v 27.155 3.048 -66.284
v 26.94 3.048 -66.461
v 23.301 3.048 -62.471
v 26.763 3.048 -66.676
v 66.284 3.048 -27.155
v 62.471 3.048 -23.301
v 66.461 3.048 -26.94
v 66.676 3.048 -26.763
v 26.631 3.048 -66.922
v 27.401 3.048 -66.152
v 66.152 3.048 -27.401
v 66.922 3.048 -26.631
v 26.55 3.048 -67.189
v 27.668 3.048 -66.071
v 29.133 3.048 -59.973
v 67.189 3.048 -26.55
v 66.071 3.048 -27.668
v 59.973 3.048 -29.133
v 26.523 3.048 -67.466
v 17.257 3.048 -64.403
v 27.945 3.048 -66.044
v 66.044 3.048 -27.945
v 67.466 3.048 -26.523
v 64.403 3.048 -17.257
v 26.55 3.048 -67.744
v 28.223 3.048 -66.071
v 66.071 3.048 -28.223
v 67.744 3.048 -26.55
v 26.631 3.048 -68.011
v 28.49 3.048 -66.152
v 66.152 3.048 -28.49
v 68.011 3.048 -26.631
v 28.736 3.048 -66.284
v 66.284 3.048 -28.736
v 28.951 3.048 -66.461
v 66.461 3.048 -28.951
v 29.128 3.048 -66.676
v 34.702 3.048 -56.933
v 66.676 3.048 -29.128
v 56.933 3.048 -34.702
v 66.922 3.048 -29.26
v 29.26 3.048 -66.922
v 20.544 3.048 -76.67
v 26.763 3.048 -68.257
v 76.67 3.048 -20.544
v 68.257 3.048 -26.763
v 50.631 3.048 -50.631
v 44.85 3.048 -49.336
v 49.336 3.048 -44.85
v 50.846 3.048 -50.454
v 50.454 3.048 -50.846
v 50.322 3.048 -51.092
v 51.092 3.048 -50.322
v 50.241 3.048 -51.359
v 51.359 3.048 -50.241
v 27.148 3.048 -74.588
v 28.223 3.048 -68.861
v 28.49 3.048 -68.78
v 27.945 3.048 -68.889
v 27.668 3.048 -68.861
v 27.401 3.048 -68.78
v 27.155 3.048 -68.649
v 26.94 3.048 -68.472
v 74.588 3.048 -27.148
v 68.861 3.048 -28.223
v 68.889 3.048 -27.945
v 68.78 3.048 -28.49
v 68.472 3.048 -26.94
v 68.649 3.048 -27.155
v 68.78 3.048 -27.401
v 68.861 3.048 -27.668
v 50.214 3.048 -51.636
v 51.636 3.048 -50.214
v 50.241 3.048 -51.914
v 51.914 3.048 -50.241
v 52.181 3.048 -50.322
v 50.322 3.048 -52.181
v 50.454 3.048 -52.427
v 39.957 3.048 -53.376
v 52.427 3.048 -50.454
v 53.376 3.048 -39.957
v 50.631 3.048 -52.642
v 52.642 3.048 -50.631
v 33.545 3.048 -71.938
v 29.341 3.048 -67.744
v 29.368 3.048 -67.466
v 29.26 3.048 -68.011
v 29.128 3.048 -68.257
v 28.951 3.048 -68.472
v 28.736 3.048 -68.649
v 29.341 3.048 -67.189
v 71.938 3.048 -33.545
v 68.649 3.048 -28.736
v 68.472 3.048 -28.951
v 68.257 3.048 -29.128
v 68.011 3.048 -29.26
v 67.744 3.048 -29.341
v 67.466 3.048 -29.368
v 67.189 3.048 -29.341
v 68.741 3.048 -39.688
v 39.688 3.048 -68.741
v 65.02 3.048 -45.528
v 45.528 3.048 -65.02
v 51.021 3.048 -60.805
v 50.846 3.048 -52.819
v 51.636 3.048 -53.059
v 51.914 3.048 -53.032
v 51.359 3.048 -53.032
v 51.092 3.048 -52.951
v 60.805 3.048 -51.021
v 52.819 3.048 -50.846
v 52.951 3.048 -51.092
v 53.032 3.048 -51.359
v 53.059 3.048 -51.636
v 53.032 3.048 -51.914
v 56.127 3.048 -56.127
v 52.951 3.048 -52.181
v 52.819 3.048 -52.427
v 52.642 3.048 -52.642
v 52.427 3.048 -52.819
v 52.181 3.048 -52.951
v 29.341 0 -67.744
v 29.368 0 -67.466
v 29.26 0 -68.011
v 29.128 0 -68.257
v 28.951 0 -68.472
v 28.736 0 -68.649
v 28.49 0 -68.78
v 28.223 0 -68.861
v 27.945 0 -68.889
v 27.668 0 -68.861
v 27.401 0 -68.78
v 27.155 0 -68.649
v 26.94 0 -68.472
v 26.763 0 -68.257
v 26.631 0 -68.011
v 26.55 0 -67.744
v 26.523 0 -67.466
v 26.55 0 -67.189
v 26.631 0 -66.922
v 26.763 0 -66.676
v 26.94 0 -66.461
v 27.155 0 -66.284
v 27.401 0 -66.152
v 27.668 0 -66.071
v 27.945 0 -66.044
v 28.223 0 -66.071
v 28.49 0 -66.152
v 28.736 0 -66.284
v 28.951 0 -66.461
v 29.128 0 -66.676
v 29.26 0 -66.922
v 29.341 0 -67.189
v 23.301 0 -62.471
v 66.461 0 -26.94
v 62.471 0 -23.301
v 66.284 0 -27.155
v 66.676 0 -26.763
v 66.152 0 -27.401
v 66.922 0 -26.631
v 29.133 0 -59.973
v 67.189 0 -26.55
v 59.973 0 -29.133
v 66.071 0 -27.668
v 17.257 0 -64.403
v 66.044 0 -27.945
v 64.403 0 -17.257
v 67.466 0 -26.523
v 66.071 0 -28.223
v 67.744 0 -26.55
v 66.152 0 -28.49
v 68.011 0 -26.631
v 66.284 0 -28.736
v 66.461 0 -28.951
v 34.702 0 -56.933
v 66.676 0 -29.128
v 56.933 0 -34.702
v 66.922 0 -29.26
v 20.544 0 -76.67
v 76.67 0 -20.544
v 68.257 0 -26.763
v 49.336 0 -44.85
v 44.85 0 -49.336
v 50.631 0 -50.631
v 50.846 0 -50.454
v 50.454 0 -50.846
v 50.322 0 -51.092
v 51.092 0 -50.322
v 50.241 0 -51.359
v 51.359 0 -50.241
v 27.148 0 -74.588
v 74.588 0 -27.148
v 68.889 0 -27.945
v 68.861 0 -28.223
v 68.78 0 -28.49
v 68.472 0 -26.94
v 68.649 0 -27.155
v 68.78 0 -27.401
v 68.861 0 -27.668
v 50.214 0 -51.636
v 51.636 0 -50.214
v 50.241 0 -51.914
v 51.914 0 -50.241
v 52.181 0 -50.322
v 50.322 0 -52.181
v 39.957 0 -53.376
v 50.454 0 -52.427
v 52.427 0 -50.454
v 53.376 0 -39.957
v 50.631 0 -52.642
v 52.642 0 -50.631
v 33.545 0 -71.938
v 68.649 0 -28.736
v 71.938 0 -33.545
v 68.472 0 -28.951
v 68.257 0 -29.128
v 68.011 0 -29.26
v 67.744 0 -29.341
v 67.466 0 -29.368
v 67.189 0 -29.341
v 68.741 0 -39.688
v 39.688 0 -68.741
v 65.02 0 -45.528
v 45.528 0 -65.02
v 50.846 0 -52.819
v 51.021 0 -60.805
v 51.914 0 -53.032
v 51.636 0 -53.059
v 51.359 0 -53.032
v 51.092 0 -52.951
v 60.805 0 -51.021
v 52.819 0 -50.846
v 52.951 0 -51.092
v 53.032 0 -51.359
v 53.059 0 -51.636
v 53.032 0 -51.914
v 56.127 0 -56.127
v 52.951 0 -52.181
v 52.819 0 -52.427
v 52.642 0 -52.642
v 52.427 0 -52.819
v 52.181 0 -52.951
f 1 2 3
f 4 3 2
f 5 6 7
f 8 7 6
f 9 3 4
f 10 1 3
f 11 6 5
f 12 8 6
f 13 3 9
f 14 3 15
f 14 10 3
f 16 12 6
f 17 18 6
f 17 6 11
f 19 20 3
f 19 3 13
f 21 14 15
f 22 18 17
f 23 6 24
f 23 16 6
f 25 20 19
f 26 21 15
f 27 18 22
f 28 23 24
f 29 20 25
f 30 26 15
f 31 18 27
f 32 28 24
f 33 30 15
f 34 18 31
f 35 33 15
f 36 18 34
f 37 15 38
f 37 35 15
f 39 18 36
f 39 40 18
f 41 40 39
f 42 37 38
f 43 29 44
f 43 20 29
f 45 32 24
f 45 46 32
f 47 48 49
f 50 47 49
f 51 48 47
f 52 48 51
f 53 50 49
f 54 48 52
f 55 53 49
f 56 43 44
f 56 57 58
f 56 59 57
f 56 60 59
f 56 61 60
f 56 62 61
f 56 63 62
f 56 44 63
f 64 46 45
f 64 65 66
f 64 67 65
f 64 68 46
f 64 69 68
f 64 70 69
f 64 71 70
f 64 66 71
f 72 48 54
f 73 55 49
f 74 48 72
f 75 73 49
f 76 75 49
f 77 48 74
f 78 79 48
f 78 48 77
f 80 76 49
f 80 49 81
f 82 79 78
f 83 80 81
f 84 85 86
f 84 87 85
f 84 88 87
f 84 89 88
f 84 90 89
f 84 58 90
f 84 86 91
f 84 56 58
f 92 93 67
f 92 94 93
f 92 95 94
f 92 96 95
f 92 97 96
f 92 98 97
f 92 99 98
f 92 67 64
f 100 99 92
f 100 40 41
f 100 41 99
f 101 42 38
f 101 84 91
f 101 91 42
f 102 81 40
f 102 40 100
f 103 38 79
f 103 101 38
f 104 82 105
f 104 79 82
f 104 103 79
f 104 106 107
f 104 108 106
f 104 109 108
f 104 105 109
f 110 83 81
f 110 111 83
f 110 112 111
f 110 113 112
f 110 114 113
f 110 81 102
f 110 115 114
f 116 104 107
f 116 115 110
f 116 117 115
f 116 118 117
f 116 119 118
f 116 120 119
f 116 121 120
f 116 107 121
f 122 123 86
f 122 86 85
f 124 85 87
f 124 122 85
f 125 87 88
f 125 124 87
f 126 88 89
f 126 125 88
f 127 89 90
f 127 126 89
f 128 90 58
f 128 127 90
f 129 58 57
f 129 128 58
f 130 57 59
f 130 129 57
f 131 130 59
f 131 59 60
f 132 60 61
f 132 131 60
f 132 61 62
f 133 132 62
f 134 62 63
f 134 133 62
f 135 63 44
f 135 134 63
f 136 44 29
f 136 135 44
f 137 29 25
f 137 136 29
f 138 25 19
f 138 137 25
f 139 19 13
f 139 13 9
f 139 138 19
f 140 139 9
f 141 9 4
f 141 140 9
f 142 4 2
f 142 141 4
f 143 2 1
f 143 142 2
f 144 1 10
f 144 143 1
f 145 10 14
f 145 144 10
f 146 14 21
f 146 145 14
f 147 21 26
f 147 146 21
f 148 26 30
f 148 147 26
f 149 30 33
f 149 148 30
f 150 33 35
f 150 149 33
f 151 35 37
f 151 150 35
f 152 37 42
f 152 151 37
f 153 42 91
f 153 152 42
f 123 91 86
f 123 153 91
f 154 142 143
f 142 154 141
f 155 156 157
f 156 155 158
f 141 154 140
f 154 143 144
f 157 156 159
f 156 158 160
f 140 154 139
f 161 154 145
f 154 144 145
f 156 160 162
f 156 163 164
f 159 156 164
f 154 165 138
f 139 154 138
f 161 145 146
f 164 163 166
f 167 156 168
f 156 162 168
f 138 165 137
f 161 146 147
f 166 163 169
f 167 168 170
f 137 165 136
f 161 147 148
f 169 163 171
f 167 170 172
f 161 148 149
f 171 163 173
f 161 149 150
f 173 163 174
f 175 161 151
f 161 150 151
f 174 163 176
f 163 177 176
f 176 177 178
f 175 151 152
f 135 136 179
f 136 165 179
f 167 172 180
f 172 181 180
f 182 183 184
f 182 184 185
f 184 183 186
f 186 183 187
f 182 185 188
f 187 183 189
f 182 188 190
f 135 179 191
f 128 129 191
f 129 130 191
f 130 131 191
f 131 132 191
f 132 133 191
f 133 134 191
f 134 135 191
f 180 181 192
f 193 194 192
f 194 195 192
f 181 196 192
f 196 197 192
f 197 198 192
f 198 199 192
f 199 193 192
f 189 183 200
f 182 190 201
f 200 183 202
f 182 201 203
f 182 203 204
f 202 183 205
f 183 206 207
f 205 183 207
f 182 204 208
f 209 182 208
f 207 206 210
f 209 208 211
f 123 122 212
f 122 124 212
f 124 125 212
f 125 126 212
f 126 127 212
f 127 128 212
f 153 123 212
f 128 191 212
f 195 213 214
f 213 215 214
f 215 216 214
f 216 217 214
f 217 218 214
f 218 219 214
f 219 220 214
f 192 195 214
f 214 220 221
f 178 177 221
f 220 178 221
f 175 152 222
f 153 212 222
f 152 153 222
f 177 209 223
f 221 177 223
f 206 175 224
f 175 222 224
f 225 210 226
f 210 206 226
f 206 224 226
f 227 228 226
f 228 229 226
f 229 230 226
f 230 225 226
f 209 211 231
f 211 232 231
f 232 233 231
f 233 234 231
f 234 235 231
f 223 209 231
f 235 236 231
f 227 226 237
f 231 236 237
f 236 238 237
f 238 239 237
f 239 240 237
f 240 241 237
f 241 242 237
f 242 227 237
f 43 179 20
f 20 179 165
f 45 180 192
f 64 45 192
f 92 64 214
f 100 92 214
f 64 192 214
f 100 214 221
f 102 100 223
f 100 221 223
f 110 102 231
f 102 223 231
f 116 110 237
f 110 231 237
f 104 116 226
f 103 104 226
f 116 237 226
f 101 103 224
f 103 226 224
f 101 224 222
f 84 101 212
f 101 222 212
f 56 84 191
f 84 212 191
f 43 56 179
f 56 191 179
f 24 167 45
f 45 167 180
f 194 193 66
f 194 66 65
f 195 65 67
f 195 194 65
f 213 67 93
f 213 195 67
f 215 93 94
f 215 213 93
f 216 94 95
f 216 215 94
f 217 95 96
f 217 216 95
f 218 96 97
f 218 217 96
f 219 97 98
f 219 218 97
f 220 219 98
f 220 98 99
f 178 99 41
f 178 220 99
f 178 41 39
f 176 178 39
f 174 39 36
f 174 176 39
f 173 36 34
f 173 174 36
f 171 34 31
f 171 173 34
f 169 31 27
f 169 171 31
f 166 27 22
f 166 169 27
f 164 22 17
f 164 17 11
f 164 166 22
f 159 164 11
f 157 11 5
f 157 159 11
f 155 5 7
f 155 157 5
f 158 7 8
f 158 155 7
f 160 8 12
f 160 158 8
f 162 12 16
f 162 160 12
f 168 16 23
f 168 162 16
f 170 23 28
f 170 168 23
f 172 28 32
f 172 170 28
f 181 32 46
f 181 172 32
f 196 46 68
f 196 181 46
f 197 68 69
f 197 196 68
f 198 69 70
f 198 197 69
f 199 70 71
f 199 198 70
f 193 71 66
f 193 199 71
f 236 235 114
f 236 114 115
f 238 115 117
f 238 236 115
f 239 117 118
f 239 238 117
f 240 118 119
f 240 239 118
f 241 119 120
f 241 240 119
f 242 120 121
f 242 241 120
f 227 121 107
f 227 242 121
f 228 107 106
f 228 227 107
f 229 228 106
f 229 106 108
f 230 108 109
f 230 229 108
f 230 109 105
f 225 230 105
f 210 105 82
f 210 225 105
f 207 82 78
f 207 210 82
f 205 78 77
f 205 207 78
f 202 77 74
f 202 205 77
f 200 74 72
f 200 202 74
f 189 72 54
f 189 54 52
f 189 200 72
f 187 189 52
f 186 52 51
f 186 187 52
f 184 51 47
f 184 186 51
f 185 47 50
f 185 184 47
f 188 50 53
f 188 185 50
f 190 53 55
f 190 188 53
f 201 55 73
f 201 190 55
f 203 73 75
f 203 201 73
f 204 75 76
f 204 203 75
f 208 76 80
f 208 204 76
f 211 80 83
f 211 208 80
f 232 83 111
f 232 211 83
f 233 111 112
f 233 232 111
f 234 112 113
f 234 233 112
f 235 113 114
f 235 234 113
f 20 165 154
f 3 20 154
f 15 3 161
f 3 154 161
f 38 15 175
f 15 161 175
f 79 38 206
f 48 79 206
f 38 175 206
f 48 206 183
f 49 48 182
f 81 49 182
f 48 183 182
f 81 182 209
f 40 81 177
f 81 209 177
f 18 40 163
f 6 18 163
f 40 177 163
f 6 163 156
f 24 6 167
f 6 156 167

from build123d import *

# Parameters (mm, degrees)
SKETCH1_R           = 1.4224
BOSS_EXTRUDE1_DEPTH = 3.048


with BuildPart() as part:
    # Sketch1 → Boss-Extrude1 (new body)
    with BuildSketch(Plane(origin=(0, 0, 0), x_dir=(1, 0, 0), z_dir=(0, 1, 0))):
        with BuildLine():
            ThreePointArc((76.670362462, 20.543761705), (56.126600757, 56.126600757), (20.543761705, 76.670362462))
            Line((20.543761705, 76.670362462), (17.256759832, 64.403104468))
            ThreePointArc((17.256759832, 64.403104468), (47.146344636, 47.146344636), (64.403104468, 17.256759832))
            Line((64.403104468, 17.256759832), (76.670362462, 20.543761705))
        make_face()
        with Locations((67.466302862, 27.945457648)):
            Circle(SKETCH1_R, mode=Mode.SUBTRACT)
        with Locations((27.945457648, 67.466302862)):
            Circle(SKETCH1_R, mode=Mode.SUBTRACT)
        with Locations((51.636472696, 51.636472696)):
            Circle(SKETCH1_R, mode=Mode.SUBTRACT)
    extrude(amount=BOSS_EXTRUDE1_DEPTH)


solid = part.part
